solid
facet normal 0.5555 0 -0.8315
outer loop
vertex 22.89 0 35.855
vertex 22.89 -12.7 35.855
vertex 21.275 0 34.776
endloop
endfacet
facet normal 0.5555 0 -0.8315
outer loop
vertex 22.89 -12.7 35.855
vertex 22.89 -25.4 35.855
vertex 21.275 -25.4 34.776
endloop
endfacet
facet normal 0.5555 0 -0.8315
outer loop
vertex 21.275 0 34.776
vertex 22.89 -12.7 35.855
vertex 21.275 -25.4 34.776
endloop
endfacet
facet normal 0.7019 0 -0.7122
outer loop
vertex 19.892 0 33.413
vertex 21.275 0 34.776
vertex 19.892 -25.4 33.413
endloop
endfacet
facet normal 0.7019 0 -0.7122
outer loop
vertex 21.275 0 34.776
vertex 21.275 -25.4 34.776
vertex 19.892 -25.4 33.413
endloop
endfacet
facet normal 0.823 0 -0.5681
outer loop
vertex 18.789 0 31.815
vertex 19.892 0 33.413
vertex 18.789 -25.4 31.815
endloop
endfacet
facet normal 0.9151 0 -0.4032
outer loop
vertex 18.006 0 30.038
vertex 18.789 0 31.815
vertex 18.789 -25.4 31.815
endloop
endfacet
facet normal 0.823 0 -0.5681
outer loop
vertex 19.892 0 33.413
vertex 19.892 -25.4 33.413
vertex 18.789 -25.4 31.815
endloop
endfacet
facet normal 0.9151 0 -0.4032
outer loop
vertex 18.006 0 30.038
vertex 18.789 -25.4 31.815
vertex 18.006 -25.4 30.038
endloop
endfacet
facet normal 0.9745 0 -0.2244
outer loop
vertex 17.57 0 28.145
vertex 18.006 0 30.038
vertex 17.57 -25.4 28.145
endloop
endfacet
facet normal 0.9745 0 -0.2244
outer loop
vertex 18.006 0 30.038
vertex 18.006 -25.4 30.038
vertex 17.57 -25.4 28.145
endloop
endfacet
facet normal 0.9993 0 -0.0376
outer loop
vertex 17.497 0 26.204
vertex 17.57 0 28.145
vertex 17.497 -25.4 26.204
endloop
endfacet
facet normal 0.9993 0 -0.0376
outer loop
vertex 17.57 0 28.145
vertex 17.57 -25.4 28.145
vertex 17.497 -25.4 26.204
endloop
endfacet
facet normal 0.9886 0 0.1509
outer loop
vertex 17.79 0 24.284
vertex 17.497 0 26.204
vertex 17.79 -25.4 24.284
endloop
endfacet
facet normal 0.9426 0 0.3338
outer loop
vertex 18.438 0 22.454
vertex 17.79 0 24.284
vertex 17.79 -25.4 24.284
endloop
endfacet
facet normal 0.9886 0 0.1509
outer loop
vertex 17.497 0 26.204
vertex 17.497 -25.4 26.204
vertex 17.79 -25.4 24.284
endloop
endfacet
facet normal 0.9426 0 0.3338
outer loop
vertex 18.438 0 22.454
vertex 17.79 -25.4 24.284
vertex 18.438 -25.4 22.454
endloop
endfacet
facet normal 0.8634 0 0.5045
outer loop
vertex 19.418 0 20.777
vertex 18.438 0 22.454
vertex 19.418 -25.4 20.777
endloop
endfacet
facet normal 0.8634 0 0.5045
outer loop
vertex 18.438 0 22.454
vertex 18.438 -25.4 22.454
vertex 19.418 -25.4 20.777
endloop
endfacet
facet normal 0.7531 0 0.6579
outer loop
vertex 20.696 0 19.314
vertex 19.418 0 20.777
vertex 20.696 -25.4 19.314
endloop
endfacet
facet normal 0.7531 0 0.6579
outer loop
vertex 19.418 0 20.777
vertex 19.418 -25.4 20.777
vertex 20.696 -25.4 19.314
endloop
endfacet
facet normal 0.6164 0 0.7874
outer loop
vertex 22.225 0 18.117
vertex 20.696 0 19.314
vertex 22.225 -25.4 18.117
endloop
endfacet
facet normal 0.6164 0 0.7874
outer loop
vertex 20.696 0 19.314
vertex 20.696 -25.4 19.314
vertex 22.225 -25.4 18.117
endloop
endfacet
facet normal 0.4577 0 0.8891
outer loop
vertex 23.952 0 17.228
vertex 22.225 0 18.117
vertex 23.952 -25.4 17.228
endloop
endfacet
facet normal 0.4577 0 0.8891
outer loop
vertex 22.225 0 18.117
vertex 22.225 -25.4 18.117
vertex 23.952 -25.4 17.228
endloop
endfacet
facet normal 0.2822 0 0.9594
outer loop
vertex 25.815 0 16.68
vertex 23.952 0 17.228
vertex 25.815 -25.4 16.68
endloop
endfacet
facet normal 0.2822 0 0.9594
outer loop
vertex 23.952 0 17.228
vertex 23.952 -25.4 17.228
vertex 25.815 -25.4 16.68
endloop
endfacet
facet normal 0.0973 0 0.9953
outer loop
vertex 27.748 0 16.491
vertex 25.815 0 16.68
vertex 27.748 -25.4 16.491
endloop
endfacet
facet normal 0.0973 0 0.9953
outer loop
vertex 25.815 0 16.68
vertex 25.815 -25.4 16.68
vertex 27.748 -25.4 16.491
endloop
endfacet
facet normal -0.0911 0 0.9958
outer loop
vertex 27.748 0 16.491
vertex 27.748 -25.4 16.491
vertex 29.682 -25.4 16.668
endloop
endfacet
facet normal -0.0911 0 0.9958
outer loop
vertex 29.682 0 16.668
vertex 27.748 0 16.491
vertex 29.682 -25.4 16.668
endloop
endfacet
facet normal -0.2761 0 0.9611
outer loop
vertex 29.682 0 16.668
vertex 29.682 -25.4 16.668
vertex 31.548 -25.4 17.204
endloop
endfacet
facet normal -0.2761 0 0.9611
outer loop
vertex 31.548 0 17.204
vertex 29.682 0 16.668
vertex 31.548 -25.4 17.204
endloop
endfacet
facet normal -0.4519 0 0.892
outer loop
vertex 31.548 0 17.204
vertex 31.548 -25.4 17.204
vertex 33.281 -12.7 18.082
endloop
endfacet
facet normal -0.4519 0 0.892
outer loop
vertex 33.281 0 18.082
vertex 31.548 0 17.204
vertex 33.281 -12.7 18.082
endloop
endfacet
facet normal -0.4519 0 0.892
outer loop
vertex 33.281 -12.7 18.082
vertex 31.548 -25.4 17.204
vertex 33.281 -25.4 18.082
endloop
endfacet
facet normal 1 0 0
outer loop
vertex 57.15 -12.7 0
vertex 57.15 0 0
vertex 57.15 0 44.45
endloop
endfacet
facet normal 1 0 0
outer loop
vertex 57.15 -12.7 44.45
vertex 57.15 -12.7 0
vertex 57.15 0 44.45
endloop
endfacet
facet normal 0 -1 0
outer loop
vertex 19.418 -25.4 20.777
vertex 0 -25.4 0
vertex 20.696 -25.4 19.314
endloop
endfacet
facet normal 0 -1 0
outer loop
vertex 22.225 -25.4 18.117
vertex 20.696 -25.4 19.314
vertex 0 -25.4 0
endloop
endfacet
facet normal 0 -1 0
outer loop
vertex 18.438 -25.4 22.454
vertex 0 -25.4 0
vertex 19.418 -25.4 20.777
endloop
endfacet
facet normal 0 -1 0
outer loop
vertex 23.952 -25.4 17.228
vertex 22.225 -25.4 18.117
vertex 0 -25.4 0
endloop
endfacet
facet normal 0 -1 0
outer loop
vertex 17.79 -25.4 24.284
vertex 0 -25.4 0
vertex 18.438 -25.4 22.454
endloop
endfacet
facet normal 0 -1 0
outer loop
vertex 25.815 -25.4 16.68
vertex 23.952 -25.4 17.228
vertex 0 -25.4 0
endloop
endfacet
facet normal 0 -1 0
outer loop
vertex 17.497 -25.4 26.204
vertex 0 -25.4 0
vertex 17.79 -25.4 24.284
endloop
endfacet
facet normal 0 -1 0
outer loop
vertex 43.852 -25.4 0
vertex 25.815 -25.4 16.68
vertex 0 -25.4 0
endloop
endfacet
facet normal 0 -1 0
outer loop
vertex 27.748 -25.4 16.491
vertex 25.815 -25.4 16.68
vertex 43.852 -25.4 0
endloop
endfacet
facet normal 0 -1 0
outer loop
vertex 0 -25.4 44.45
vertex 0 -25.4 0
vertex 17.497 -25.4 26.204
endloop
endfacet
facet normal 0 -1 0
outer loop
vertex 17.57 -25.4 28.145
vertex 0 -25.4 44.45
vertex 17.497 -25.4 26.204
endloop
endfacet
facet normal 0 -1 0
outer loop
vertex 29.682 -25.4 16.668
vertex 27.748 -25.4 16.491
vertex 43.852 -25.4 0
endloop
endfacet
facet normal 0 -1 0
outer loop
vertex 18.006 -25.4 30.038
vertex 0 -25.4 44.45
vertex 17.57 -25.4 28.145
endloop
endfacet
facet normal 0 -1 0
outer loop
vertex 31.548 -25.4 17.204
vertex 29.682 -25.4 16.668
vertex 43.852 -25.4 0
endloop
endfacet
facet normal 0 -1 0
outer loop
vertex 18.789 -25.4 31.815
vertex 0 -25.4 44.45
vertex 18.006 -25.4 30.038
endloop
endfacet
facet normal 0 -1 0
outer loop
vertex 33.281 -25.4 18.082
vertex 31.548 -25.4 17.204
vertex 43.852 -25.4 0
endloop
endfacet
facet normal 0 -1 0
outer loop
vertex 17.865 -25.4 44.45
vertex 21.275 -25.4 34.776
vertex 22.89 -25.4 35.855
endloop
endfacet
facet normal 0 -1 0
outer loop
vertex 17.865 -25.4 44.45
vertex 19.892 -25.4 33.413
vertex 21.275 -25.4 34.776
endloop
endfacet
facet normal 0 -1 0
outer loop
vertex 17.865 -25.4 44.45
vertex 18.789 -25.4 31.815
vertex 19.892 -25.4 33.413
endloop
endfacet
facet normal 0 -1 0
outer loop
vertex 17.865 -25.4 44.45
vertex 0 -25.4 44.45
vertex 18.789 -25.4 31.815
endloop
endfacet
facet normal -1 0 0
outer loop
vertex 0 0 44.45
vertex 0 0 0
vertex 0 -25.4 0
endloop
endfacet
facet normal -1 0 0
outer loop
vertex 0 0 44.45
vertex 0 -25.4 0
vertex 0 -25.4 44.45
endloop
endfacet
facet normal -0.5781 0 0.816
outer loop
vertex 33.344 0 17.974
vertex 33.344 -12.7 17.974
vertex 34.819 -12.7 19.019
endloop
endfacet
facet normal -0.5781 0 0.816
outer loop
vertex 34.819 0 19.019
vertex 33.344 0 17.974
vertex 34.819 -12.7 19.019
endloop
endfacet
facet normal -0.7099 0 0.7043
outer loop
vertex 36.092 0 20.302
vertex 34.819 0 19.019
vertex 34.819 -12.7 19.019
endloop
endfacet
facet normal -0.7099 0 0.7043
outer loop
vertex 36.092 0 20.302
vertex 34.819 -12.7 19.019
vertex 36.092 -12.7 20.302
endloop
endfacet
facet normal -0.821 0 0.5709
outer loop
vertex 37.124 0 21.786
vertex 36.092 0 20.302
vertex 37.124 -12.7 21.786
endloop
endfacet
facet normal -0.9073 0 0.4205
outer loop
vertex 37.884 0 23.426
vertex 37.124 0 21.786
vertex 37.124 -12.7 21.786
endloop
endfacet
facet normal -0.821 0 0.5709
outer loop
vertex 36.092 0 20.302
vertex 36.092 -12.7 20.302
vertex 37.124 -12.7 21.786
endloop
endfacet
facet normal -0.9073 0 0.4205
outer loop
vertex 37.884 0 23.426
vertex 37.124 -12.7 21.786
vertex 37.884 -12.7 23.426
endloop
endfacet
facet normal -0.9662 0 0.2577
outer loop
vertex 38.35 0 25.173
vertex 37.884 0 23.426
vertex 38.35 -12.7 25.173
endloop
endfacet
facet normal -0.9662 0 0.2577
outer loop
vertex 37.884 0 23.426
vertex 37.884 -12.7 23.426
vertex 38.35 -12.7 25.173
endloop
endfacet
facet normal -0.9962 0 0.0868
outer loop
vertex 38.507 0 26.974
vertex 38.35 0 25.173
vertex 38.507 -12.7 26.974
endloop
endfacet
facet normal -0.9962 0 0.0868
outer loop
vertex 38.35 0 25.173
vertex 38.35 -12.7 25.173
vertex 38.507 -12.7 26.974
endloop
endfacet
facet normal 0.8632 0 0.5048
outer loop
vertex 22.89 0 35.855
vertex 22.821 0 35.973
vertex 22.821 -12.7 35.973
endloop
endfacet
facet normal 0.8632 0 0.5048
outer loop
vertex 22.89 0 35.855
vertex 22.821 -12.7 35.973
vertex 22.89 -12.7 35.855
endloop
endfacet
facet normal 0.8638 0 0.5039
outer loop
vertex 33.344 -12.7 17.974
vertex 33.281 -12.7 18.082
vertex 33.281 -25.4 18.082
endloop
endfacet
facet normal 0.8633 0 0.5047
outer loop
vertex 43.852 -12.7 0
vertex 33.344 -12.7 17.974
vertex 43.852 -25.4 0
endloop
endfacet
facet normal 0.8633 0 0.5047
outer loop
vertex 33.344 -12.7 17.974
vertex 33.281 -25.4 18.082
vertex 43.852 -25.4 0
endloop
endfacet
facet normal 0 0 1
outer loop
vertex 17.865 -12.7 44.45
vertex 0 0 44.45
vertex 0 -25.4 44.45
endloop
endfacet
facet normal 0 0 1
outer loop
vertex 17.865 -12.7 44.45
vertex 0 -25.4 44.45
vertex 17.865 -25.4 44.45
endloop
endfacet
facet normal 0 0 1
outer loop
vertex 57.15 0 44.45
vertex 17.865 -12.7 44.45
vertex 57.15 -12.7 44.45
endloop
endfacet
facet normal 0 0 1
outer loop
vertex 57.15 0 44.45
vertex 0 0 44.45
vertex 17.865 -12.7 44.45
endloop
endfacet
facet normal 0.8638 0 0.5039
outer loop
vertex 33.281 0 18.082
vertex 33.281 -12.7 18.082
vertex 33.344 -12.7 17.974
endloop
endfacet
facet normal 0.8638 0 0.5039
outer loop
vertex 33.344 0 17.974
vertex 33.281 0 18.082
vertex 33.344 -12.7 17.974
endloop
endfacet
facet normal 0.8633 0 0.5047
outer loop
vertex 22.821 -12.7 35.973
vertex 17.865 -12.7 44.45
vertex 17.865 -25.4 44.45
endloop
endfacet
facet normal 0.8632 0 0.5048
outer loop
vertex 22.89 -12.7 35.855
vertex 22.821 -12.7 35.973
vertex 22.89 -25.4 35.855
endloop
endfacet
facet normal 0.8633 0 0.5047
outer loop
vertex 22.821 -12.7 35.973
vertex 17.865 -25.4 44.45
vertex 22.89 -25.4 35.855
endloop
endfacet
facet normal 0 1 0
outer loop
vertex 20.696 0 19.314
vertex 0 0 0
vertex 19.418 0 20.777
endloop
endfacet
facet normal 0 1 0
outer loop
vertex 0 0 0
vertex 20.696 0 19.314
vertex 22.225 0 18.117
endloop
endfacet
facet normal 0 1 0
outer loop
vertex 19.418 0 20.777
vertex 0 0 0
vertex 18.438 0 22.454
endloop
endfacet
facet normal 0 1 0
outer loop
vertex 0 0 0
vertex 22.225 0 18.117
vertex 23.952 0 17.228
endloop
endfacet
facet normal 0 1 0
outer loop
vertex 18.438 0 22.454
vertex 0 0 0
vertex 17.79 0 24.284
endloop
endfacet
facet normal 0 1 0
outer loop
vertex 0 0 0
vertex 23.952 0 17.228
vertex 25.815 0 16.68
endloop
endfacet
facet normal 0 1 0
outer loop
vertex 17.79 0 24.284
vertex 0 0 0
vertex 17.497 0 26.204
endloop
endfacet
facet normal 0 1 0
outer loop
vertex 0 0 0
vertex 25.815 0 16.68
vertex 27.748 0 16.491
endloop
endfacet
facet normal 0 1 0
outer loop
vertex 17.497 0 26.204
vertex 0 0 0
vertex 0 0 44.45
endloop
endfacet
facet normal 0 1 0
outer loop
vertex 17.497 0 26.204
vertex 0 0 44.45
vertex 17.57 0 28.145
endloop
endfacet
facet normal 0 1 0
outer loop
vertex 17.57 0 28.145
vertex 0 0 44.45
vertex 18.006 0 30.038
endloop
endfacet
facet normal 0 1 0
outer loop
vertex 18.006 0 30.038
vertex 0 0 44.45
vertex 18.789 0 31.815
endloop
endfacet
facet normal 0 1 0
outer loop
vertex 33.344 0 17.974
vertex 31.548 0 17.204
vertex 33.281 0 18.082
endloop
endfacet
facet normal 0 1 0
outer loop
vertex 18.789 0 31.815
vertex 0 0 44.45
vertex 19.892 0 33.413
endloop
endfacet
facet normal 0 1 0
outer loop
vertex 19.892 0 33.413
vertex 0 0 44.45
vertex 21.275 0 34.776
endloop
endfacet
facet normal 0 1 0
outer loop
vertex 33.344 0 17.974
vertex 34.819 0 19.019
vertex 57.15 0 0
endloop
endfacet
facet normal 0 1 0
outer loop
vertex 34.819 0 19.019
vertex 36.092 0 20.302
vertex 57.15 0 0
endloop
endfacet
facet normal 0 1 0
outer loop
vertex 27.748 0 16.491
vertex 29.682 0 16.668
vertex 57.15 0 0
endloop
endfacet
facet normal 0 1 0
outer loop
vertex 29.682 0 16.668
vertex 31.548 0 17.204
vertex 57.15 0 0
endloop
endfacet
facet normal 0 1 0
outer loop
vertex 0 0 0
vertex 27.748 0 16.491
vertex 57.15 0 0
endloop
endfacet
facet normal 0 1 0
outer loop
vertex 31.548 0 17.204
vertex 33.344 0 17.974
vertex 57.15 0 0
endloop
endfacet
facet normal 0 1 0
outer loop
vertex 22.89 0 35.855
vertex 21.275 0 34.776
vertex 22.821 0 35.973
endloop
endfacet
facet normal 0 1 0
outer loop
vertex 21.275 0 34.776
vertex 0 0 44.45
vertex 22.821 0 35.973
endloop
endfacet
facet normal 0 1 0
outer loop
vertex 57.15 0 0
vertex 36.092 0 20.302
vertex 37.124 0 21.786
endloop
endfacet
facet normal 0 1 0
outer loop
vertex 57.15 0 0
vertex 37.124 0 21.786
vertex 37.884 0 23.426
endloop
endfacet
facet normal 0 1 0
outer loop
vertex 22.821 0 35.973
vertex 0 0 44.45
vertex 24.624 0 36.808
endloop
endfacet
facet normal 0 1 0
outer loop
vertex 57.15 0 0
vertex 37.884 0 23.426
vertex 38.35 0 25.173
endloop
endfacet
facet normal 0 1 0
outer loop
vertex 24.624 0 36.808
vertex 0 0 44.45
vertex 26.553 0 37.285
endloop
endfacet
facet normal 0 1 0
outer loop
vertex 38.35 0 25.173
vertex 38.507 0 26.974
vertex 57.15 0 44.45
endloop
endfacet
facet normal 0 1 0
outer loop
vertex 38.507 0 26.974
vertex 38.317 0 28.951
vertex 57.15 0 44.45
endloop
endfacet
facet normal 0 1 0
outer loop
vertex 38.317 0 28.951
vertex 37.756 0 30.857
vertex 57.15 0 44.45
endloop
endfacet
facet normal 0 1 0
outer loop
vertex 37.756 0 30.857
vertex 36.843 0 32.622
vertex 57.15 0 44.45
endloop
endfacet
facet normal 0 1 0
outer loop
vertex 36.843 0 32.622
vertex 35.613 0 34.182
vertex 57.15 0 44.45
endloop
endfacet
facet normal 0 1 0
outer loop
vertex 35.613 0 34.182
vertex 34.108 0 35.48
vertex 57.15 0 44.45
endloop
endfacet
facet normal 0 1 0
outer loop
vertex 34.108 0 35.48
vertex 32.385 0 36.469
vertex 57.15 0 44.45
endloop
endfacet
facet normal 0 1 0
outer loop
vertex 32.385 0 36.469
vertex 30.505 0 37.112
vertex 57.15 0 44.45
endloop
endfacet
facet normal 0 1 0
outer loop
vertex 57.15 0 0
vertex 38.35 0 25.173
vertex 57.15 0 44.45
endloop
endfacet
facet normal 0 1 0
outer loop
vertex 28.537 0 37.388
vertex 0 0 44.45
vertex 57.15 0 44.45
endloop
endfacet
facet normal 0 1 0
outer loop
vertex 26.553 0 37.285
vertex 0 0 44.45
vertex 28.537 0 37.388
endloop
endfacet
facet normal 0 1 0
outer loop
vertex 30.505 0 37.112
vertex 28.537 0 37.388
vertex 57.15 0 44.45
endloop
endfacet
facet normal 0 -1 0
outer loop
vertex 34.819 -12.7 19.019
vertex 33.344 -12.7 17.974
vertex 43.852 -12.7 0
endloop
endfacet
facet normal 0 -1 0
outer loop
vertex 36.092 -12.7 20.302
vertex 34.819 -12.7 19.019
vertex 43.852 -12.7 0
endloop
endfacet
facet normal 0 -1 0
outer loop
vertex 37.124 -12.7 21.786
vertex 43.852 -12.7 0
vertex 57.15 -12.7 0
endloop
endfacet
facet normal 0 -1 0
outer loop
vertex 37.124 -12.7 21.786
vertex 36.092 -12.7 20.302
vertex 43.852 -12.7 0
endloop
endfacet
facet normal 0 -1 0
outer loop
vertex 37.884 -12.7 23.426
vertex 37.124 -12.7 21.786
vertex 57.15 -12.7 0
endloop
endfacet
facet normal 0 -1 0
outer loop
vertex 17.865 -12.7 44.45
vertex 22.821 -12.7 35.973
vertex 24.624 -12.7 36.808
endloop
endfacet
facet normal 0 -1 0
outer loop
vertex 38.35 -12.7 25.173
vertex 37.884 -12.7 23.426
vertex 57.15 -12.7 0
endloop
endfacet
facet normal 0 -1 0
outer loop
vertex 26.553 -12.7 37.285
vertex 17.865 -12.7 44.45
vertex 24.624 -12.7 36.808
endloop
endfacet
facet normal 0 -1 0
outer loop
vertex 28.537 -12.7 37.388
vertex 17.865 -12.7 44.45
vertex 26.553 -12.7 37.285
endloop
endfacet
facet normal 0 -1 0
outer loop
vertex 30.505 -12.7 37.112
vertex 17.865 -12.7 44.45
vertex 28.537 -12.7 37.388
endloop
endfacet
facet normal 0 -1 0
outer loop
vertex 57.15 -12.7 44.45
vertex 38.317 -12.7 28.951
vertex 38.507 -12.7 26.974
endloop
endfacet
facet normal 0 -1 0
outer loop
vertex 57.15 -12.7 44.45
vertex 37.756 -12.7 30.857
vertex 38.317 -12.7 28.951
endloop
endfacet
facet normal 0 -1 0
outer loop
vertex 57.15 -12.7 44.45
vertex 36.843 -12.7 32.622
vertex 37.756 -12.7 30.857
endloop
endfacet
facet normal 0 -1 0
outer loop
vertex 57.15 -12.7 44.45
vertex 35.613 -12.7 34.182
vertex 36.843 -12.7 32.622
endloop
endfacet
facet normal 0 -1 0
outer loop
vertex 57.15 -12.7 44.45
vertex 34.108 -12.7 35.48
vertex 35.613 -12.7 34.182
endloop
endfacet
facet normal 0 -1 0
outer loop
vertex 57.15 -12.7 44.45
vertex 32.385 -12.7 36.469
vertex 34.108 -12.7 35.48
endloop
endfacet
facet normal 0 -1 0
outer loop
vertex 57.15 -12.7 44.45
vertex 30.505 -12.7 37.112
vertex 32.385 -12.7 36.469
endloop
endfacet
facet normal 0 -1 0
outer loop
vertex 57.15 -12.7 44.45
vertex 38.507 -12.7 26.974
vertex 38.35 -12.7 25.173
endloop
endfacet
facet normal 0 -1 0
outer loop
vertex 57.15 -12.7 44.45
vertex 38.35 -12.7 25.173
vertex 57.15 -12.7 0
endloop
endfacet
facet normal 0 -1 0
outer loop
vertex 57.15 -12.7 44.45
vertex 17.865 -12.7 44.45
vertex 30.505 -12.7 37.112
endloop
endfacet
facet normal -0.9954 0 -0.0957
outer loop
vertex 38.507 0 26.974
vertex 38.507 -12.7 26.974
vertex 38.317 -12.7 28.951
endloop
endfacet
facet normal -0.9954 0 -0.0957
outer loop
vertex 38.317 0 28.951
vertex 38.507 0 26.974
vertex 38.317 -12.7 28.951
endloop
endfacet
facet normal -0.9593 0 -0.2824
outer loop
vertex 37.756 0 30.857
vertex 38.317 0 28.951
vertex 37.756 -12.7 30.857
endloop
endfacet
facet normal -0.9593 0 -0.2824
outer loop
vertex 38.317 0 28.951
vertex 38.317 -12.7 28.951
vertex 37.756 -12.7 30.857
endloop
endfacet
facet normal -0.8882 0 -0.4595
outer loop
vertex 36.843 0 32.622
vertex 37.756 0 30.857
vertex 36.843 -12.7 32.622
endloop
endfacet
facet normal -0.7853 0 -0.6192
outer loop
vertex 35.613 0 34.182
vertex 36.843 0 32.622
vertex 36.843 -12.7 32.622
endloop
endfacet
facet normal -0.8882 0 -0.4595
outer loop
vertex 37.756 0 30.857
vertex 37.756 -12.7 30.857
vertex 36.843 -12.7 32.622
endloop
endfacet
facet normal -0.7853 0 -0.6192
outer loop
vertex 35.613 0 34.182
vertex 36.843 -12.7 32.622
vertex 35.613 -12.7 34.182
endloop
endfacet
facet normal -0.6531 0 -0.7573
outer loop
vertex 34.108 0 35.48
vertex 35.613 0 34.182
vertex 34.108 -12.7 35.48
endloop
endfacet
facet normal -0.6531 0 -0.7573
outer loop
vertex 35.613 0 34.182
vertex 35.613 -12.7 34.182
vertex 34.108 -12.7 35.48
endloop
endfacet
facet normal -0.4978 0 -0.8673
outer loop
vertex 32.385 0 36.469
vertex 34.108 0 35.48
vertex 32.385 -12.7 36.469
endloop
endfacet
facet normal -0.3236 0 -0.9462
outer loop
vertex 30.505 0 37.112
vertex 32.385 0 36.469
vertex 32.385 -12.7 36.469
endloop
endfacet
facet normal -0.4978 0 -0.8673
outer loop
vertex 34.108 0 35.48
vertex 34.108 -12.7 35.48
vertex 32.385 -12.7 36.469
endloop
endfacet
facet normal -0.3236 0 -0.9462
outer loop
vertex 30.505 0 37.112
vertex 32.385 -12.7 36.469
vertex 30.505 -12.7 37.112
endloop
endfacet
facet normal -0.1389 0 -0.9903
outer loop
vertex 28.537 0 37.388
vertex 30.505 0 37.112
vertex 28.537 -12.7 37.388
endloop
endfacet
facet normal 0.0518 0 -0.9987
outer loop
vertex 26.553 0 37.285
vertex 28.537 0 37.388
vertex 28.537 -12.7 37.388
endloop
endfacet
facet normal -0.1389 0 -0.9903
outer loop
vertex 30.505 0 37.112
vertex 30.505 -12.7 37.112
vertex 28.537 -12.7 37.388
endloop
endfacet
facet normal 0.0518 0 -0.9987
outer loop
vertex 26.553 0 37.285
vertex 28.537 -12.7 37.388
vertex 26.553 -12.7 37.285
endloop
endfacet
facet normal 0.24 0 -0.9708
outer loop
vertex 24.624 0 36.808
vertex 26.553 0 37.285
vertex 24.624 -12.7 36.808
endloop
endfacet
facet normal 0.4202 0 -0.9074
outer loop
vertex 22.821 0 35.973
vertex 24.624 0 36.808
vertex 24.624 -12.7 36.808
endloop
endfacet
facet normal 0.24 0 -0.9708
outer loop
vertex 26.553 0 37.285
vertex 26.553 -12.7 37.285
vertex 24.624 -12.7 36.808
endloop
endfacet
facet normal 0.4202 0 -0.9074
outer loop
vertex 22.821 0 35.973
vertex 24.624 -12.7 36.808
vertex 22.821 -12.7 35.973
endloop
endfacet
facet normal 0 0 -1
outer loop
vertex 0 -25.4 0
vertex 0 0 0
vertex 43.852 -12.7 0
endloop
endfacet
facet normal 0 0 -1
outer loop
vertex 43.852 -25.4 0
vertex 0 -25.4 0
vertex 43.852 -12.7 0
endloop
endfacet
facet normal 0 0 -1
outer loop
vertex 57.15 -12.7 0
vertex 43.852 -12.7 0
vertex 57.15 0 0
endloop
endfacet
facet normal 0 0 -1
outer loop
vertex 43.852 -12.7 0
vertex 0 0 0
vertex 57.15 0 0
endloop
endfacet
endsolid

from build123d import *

# Parameters (mm, degrees)
F0_W     = 57.15
F0_H     = 44.45
F1_DEPTH = 25.4
F3_DEPTH = 12.7
F5_DEPTH = 12.701
F7_DEPTH = 25.401


with BuildPart() as f1:
    # F0 (on Front) → F1 (new body)
    with BuildSketch(Plane.XZ):
        with Locations((28.575, 22.225)):
            Rectangle(F0_W, F0_H)
    extrude(amount=F1_DEPTH)

    # F2 (on face) → F3 (cut)
    with BuildSketch(Plane.XZ.offset(25.4)):
        Polygon((57.15, 44.45), (17.8654808551, 44.45), (43.8516363502, 0), (57.15, 0), align=None)
    extrude(amount=-F3_DEPTH, mode=Mode.SUBTRACT)

    # F4 (on face) → F5 (cut, through all)
    with BuildSketch(Plane.XZ.offset(12.7)):
        with BuildLine():
            ThreePointArc((33.3435072178, 17.9744302701), (37.1242051851, 21.7860579667), (38.5066656507, 26.9736379303))
            ThreePointArc((38.5066656507, 26.9736379303), (33.2700116001, 36.0154114789), (22.8213560552, 35.9728455904))
            Line((22.8213560552, 35.9728455904), (33.3435072178, 17.9744302701))
        make_face()
    extrude(amount=-F5_DEPTH, mode=Mode.SUBTRACT)

    # F6 (on face) → F7 (cut, through all)
    with BuildSketch(Plane.XZ.offset(25.4)):
        with BuildLine():
            Line((33.2805792258, 18.0820702495), (22.8900132849, 35.8554055997))
            ThreePointArc((22.8900132849, 35.8554055997), (18.8883674995, 21.5920715416), (33.2805792258, 18.0820702495))
        make_face()
    extrude(amount=-F7_DEPTH, mode=Mode.SUBTRACT)


solid = f1.part
